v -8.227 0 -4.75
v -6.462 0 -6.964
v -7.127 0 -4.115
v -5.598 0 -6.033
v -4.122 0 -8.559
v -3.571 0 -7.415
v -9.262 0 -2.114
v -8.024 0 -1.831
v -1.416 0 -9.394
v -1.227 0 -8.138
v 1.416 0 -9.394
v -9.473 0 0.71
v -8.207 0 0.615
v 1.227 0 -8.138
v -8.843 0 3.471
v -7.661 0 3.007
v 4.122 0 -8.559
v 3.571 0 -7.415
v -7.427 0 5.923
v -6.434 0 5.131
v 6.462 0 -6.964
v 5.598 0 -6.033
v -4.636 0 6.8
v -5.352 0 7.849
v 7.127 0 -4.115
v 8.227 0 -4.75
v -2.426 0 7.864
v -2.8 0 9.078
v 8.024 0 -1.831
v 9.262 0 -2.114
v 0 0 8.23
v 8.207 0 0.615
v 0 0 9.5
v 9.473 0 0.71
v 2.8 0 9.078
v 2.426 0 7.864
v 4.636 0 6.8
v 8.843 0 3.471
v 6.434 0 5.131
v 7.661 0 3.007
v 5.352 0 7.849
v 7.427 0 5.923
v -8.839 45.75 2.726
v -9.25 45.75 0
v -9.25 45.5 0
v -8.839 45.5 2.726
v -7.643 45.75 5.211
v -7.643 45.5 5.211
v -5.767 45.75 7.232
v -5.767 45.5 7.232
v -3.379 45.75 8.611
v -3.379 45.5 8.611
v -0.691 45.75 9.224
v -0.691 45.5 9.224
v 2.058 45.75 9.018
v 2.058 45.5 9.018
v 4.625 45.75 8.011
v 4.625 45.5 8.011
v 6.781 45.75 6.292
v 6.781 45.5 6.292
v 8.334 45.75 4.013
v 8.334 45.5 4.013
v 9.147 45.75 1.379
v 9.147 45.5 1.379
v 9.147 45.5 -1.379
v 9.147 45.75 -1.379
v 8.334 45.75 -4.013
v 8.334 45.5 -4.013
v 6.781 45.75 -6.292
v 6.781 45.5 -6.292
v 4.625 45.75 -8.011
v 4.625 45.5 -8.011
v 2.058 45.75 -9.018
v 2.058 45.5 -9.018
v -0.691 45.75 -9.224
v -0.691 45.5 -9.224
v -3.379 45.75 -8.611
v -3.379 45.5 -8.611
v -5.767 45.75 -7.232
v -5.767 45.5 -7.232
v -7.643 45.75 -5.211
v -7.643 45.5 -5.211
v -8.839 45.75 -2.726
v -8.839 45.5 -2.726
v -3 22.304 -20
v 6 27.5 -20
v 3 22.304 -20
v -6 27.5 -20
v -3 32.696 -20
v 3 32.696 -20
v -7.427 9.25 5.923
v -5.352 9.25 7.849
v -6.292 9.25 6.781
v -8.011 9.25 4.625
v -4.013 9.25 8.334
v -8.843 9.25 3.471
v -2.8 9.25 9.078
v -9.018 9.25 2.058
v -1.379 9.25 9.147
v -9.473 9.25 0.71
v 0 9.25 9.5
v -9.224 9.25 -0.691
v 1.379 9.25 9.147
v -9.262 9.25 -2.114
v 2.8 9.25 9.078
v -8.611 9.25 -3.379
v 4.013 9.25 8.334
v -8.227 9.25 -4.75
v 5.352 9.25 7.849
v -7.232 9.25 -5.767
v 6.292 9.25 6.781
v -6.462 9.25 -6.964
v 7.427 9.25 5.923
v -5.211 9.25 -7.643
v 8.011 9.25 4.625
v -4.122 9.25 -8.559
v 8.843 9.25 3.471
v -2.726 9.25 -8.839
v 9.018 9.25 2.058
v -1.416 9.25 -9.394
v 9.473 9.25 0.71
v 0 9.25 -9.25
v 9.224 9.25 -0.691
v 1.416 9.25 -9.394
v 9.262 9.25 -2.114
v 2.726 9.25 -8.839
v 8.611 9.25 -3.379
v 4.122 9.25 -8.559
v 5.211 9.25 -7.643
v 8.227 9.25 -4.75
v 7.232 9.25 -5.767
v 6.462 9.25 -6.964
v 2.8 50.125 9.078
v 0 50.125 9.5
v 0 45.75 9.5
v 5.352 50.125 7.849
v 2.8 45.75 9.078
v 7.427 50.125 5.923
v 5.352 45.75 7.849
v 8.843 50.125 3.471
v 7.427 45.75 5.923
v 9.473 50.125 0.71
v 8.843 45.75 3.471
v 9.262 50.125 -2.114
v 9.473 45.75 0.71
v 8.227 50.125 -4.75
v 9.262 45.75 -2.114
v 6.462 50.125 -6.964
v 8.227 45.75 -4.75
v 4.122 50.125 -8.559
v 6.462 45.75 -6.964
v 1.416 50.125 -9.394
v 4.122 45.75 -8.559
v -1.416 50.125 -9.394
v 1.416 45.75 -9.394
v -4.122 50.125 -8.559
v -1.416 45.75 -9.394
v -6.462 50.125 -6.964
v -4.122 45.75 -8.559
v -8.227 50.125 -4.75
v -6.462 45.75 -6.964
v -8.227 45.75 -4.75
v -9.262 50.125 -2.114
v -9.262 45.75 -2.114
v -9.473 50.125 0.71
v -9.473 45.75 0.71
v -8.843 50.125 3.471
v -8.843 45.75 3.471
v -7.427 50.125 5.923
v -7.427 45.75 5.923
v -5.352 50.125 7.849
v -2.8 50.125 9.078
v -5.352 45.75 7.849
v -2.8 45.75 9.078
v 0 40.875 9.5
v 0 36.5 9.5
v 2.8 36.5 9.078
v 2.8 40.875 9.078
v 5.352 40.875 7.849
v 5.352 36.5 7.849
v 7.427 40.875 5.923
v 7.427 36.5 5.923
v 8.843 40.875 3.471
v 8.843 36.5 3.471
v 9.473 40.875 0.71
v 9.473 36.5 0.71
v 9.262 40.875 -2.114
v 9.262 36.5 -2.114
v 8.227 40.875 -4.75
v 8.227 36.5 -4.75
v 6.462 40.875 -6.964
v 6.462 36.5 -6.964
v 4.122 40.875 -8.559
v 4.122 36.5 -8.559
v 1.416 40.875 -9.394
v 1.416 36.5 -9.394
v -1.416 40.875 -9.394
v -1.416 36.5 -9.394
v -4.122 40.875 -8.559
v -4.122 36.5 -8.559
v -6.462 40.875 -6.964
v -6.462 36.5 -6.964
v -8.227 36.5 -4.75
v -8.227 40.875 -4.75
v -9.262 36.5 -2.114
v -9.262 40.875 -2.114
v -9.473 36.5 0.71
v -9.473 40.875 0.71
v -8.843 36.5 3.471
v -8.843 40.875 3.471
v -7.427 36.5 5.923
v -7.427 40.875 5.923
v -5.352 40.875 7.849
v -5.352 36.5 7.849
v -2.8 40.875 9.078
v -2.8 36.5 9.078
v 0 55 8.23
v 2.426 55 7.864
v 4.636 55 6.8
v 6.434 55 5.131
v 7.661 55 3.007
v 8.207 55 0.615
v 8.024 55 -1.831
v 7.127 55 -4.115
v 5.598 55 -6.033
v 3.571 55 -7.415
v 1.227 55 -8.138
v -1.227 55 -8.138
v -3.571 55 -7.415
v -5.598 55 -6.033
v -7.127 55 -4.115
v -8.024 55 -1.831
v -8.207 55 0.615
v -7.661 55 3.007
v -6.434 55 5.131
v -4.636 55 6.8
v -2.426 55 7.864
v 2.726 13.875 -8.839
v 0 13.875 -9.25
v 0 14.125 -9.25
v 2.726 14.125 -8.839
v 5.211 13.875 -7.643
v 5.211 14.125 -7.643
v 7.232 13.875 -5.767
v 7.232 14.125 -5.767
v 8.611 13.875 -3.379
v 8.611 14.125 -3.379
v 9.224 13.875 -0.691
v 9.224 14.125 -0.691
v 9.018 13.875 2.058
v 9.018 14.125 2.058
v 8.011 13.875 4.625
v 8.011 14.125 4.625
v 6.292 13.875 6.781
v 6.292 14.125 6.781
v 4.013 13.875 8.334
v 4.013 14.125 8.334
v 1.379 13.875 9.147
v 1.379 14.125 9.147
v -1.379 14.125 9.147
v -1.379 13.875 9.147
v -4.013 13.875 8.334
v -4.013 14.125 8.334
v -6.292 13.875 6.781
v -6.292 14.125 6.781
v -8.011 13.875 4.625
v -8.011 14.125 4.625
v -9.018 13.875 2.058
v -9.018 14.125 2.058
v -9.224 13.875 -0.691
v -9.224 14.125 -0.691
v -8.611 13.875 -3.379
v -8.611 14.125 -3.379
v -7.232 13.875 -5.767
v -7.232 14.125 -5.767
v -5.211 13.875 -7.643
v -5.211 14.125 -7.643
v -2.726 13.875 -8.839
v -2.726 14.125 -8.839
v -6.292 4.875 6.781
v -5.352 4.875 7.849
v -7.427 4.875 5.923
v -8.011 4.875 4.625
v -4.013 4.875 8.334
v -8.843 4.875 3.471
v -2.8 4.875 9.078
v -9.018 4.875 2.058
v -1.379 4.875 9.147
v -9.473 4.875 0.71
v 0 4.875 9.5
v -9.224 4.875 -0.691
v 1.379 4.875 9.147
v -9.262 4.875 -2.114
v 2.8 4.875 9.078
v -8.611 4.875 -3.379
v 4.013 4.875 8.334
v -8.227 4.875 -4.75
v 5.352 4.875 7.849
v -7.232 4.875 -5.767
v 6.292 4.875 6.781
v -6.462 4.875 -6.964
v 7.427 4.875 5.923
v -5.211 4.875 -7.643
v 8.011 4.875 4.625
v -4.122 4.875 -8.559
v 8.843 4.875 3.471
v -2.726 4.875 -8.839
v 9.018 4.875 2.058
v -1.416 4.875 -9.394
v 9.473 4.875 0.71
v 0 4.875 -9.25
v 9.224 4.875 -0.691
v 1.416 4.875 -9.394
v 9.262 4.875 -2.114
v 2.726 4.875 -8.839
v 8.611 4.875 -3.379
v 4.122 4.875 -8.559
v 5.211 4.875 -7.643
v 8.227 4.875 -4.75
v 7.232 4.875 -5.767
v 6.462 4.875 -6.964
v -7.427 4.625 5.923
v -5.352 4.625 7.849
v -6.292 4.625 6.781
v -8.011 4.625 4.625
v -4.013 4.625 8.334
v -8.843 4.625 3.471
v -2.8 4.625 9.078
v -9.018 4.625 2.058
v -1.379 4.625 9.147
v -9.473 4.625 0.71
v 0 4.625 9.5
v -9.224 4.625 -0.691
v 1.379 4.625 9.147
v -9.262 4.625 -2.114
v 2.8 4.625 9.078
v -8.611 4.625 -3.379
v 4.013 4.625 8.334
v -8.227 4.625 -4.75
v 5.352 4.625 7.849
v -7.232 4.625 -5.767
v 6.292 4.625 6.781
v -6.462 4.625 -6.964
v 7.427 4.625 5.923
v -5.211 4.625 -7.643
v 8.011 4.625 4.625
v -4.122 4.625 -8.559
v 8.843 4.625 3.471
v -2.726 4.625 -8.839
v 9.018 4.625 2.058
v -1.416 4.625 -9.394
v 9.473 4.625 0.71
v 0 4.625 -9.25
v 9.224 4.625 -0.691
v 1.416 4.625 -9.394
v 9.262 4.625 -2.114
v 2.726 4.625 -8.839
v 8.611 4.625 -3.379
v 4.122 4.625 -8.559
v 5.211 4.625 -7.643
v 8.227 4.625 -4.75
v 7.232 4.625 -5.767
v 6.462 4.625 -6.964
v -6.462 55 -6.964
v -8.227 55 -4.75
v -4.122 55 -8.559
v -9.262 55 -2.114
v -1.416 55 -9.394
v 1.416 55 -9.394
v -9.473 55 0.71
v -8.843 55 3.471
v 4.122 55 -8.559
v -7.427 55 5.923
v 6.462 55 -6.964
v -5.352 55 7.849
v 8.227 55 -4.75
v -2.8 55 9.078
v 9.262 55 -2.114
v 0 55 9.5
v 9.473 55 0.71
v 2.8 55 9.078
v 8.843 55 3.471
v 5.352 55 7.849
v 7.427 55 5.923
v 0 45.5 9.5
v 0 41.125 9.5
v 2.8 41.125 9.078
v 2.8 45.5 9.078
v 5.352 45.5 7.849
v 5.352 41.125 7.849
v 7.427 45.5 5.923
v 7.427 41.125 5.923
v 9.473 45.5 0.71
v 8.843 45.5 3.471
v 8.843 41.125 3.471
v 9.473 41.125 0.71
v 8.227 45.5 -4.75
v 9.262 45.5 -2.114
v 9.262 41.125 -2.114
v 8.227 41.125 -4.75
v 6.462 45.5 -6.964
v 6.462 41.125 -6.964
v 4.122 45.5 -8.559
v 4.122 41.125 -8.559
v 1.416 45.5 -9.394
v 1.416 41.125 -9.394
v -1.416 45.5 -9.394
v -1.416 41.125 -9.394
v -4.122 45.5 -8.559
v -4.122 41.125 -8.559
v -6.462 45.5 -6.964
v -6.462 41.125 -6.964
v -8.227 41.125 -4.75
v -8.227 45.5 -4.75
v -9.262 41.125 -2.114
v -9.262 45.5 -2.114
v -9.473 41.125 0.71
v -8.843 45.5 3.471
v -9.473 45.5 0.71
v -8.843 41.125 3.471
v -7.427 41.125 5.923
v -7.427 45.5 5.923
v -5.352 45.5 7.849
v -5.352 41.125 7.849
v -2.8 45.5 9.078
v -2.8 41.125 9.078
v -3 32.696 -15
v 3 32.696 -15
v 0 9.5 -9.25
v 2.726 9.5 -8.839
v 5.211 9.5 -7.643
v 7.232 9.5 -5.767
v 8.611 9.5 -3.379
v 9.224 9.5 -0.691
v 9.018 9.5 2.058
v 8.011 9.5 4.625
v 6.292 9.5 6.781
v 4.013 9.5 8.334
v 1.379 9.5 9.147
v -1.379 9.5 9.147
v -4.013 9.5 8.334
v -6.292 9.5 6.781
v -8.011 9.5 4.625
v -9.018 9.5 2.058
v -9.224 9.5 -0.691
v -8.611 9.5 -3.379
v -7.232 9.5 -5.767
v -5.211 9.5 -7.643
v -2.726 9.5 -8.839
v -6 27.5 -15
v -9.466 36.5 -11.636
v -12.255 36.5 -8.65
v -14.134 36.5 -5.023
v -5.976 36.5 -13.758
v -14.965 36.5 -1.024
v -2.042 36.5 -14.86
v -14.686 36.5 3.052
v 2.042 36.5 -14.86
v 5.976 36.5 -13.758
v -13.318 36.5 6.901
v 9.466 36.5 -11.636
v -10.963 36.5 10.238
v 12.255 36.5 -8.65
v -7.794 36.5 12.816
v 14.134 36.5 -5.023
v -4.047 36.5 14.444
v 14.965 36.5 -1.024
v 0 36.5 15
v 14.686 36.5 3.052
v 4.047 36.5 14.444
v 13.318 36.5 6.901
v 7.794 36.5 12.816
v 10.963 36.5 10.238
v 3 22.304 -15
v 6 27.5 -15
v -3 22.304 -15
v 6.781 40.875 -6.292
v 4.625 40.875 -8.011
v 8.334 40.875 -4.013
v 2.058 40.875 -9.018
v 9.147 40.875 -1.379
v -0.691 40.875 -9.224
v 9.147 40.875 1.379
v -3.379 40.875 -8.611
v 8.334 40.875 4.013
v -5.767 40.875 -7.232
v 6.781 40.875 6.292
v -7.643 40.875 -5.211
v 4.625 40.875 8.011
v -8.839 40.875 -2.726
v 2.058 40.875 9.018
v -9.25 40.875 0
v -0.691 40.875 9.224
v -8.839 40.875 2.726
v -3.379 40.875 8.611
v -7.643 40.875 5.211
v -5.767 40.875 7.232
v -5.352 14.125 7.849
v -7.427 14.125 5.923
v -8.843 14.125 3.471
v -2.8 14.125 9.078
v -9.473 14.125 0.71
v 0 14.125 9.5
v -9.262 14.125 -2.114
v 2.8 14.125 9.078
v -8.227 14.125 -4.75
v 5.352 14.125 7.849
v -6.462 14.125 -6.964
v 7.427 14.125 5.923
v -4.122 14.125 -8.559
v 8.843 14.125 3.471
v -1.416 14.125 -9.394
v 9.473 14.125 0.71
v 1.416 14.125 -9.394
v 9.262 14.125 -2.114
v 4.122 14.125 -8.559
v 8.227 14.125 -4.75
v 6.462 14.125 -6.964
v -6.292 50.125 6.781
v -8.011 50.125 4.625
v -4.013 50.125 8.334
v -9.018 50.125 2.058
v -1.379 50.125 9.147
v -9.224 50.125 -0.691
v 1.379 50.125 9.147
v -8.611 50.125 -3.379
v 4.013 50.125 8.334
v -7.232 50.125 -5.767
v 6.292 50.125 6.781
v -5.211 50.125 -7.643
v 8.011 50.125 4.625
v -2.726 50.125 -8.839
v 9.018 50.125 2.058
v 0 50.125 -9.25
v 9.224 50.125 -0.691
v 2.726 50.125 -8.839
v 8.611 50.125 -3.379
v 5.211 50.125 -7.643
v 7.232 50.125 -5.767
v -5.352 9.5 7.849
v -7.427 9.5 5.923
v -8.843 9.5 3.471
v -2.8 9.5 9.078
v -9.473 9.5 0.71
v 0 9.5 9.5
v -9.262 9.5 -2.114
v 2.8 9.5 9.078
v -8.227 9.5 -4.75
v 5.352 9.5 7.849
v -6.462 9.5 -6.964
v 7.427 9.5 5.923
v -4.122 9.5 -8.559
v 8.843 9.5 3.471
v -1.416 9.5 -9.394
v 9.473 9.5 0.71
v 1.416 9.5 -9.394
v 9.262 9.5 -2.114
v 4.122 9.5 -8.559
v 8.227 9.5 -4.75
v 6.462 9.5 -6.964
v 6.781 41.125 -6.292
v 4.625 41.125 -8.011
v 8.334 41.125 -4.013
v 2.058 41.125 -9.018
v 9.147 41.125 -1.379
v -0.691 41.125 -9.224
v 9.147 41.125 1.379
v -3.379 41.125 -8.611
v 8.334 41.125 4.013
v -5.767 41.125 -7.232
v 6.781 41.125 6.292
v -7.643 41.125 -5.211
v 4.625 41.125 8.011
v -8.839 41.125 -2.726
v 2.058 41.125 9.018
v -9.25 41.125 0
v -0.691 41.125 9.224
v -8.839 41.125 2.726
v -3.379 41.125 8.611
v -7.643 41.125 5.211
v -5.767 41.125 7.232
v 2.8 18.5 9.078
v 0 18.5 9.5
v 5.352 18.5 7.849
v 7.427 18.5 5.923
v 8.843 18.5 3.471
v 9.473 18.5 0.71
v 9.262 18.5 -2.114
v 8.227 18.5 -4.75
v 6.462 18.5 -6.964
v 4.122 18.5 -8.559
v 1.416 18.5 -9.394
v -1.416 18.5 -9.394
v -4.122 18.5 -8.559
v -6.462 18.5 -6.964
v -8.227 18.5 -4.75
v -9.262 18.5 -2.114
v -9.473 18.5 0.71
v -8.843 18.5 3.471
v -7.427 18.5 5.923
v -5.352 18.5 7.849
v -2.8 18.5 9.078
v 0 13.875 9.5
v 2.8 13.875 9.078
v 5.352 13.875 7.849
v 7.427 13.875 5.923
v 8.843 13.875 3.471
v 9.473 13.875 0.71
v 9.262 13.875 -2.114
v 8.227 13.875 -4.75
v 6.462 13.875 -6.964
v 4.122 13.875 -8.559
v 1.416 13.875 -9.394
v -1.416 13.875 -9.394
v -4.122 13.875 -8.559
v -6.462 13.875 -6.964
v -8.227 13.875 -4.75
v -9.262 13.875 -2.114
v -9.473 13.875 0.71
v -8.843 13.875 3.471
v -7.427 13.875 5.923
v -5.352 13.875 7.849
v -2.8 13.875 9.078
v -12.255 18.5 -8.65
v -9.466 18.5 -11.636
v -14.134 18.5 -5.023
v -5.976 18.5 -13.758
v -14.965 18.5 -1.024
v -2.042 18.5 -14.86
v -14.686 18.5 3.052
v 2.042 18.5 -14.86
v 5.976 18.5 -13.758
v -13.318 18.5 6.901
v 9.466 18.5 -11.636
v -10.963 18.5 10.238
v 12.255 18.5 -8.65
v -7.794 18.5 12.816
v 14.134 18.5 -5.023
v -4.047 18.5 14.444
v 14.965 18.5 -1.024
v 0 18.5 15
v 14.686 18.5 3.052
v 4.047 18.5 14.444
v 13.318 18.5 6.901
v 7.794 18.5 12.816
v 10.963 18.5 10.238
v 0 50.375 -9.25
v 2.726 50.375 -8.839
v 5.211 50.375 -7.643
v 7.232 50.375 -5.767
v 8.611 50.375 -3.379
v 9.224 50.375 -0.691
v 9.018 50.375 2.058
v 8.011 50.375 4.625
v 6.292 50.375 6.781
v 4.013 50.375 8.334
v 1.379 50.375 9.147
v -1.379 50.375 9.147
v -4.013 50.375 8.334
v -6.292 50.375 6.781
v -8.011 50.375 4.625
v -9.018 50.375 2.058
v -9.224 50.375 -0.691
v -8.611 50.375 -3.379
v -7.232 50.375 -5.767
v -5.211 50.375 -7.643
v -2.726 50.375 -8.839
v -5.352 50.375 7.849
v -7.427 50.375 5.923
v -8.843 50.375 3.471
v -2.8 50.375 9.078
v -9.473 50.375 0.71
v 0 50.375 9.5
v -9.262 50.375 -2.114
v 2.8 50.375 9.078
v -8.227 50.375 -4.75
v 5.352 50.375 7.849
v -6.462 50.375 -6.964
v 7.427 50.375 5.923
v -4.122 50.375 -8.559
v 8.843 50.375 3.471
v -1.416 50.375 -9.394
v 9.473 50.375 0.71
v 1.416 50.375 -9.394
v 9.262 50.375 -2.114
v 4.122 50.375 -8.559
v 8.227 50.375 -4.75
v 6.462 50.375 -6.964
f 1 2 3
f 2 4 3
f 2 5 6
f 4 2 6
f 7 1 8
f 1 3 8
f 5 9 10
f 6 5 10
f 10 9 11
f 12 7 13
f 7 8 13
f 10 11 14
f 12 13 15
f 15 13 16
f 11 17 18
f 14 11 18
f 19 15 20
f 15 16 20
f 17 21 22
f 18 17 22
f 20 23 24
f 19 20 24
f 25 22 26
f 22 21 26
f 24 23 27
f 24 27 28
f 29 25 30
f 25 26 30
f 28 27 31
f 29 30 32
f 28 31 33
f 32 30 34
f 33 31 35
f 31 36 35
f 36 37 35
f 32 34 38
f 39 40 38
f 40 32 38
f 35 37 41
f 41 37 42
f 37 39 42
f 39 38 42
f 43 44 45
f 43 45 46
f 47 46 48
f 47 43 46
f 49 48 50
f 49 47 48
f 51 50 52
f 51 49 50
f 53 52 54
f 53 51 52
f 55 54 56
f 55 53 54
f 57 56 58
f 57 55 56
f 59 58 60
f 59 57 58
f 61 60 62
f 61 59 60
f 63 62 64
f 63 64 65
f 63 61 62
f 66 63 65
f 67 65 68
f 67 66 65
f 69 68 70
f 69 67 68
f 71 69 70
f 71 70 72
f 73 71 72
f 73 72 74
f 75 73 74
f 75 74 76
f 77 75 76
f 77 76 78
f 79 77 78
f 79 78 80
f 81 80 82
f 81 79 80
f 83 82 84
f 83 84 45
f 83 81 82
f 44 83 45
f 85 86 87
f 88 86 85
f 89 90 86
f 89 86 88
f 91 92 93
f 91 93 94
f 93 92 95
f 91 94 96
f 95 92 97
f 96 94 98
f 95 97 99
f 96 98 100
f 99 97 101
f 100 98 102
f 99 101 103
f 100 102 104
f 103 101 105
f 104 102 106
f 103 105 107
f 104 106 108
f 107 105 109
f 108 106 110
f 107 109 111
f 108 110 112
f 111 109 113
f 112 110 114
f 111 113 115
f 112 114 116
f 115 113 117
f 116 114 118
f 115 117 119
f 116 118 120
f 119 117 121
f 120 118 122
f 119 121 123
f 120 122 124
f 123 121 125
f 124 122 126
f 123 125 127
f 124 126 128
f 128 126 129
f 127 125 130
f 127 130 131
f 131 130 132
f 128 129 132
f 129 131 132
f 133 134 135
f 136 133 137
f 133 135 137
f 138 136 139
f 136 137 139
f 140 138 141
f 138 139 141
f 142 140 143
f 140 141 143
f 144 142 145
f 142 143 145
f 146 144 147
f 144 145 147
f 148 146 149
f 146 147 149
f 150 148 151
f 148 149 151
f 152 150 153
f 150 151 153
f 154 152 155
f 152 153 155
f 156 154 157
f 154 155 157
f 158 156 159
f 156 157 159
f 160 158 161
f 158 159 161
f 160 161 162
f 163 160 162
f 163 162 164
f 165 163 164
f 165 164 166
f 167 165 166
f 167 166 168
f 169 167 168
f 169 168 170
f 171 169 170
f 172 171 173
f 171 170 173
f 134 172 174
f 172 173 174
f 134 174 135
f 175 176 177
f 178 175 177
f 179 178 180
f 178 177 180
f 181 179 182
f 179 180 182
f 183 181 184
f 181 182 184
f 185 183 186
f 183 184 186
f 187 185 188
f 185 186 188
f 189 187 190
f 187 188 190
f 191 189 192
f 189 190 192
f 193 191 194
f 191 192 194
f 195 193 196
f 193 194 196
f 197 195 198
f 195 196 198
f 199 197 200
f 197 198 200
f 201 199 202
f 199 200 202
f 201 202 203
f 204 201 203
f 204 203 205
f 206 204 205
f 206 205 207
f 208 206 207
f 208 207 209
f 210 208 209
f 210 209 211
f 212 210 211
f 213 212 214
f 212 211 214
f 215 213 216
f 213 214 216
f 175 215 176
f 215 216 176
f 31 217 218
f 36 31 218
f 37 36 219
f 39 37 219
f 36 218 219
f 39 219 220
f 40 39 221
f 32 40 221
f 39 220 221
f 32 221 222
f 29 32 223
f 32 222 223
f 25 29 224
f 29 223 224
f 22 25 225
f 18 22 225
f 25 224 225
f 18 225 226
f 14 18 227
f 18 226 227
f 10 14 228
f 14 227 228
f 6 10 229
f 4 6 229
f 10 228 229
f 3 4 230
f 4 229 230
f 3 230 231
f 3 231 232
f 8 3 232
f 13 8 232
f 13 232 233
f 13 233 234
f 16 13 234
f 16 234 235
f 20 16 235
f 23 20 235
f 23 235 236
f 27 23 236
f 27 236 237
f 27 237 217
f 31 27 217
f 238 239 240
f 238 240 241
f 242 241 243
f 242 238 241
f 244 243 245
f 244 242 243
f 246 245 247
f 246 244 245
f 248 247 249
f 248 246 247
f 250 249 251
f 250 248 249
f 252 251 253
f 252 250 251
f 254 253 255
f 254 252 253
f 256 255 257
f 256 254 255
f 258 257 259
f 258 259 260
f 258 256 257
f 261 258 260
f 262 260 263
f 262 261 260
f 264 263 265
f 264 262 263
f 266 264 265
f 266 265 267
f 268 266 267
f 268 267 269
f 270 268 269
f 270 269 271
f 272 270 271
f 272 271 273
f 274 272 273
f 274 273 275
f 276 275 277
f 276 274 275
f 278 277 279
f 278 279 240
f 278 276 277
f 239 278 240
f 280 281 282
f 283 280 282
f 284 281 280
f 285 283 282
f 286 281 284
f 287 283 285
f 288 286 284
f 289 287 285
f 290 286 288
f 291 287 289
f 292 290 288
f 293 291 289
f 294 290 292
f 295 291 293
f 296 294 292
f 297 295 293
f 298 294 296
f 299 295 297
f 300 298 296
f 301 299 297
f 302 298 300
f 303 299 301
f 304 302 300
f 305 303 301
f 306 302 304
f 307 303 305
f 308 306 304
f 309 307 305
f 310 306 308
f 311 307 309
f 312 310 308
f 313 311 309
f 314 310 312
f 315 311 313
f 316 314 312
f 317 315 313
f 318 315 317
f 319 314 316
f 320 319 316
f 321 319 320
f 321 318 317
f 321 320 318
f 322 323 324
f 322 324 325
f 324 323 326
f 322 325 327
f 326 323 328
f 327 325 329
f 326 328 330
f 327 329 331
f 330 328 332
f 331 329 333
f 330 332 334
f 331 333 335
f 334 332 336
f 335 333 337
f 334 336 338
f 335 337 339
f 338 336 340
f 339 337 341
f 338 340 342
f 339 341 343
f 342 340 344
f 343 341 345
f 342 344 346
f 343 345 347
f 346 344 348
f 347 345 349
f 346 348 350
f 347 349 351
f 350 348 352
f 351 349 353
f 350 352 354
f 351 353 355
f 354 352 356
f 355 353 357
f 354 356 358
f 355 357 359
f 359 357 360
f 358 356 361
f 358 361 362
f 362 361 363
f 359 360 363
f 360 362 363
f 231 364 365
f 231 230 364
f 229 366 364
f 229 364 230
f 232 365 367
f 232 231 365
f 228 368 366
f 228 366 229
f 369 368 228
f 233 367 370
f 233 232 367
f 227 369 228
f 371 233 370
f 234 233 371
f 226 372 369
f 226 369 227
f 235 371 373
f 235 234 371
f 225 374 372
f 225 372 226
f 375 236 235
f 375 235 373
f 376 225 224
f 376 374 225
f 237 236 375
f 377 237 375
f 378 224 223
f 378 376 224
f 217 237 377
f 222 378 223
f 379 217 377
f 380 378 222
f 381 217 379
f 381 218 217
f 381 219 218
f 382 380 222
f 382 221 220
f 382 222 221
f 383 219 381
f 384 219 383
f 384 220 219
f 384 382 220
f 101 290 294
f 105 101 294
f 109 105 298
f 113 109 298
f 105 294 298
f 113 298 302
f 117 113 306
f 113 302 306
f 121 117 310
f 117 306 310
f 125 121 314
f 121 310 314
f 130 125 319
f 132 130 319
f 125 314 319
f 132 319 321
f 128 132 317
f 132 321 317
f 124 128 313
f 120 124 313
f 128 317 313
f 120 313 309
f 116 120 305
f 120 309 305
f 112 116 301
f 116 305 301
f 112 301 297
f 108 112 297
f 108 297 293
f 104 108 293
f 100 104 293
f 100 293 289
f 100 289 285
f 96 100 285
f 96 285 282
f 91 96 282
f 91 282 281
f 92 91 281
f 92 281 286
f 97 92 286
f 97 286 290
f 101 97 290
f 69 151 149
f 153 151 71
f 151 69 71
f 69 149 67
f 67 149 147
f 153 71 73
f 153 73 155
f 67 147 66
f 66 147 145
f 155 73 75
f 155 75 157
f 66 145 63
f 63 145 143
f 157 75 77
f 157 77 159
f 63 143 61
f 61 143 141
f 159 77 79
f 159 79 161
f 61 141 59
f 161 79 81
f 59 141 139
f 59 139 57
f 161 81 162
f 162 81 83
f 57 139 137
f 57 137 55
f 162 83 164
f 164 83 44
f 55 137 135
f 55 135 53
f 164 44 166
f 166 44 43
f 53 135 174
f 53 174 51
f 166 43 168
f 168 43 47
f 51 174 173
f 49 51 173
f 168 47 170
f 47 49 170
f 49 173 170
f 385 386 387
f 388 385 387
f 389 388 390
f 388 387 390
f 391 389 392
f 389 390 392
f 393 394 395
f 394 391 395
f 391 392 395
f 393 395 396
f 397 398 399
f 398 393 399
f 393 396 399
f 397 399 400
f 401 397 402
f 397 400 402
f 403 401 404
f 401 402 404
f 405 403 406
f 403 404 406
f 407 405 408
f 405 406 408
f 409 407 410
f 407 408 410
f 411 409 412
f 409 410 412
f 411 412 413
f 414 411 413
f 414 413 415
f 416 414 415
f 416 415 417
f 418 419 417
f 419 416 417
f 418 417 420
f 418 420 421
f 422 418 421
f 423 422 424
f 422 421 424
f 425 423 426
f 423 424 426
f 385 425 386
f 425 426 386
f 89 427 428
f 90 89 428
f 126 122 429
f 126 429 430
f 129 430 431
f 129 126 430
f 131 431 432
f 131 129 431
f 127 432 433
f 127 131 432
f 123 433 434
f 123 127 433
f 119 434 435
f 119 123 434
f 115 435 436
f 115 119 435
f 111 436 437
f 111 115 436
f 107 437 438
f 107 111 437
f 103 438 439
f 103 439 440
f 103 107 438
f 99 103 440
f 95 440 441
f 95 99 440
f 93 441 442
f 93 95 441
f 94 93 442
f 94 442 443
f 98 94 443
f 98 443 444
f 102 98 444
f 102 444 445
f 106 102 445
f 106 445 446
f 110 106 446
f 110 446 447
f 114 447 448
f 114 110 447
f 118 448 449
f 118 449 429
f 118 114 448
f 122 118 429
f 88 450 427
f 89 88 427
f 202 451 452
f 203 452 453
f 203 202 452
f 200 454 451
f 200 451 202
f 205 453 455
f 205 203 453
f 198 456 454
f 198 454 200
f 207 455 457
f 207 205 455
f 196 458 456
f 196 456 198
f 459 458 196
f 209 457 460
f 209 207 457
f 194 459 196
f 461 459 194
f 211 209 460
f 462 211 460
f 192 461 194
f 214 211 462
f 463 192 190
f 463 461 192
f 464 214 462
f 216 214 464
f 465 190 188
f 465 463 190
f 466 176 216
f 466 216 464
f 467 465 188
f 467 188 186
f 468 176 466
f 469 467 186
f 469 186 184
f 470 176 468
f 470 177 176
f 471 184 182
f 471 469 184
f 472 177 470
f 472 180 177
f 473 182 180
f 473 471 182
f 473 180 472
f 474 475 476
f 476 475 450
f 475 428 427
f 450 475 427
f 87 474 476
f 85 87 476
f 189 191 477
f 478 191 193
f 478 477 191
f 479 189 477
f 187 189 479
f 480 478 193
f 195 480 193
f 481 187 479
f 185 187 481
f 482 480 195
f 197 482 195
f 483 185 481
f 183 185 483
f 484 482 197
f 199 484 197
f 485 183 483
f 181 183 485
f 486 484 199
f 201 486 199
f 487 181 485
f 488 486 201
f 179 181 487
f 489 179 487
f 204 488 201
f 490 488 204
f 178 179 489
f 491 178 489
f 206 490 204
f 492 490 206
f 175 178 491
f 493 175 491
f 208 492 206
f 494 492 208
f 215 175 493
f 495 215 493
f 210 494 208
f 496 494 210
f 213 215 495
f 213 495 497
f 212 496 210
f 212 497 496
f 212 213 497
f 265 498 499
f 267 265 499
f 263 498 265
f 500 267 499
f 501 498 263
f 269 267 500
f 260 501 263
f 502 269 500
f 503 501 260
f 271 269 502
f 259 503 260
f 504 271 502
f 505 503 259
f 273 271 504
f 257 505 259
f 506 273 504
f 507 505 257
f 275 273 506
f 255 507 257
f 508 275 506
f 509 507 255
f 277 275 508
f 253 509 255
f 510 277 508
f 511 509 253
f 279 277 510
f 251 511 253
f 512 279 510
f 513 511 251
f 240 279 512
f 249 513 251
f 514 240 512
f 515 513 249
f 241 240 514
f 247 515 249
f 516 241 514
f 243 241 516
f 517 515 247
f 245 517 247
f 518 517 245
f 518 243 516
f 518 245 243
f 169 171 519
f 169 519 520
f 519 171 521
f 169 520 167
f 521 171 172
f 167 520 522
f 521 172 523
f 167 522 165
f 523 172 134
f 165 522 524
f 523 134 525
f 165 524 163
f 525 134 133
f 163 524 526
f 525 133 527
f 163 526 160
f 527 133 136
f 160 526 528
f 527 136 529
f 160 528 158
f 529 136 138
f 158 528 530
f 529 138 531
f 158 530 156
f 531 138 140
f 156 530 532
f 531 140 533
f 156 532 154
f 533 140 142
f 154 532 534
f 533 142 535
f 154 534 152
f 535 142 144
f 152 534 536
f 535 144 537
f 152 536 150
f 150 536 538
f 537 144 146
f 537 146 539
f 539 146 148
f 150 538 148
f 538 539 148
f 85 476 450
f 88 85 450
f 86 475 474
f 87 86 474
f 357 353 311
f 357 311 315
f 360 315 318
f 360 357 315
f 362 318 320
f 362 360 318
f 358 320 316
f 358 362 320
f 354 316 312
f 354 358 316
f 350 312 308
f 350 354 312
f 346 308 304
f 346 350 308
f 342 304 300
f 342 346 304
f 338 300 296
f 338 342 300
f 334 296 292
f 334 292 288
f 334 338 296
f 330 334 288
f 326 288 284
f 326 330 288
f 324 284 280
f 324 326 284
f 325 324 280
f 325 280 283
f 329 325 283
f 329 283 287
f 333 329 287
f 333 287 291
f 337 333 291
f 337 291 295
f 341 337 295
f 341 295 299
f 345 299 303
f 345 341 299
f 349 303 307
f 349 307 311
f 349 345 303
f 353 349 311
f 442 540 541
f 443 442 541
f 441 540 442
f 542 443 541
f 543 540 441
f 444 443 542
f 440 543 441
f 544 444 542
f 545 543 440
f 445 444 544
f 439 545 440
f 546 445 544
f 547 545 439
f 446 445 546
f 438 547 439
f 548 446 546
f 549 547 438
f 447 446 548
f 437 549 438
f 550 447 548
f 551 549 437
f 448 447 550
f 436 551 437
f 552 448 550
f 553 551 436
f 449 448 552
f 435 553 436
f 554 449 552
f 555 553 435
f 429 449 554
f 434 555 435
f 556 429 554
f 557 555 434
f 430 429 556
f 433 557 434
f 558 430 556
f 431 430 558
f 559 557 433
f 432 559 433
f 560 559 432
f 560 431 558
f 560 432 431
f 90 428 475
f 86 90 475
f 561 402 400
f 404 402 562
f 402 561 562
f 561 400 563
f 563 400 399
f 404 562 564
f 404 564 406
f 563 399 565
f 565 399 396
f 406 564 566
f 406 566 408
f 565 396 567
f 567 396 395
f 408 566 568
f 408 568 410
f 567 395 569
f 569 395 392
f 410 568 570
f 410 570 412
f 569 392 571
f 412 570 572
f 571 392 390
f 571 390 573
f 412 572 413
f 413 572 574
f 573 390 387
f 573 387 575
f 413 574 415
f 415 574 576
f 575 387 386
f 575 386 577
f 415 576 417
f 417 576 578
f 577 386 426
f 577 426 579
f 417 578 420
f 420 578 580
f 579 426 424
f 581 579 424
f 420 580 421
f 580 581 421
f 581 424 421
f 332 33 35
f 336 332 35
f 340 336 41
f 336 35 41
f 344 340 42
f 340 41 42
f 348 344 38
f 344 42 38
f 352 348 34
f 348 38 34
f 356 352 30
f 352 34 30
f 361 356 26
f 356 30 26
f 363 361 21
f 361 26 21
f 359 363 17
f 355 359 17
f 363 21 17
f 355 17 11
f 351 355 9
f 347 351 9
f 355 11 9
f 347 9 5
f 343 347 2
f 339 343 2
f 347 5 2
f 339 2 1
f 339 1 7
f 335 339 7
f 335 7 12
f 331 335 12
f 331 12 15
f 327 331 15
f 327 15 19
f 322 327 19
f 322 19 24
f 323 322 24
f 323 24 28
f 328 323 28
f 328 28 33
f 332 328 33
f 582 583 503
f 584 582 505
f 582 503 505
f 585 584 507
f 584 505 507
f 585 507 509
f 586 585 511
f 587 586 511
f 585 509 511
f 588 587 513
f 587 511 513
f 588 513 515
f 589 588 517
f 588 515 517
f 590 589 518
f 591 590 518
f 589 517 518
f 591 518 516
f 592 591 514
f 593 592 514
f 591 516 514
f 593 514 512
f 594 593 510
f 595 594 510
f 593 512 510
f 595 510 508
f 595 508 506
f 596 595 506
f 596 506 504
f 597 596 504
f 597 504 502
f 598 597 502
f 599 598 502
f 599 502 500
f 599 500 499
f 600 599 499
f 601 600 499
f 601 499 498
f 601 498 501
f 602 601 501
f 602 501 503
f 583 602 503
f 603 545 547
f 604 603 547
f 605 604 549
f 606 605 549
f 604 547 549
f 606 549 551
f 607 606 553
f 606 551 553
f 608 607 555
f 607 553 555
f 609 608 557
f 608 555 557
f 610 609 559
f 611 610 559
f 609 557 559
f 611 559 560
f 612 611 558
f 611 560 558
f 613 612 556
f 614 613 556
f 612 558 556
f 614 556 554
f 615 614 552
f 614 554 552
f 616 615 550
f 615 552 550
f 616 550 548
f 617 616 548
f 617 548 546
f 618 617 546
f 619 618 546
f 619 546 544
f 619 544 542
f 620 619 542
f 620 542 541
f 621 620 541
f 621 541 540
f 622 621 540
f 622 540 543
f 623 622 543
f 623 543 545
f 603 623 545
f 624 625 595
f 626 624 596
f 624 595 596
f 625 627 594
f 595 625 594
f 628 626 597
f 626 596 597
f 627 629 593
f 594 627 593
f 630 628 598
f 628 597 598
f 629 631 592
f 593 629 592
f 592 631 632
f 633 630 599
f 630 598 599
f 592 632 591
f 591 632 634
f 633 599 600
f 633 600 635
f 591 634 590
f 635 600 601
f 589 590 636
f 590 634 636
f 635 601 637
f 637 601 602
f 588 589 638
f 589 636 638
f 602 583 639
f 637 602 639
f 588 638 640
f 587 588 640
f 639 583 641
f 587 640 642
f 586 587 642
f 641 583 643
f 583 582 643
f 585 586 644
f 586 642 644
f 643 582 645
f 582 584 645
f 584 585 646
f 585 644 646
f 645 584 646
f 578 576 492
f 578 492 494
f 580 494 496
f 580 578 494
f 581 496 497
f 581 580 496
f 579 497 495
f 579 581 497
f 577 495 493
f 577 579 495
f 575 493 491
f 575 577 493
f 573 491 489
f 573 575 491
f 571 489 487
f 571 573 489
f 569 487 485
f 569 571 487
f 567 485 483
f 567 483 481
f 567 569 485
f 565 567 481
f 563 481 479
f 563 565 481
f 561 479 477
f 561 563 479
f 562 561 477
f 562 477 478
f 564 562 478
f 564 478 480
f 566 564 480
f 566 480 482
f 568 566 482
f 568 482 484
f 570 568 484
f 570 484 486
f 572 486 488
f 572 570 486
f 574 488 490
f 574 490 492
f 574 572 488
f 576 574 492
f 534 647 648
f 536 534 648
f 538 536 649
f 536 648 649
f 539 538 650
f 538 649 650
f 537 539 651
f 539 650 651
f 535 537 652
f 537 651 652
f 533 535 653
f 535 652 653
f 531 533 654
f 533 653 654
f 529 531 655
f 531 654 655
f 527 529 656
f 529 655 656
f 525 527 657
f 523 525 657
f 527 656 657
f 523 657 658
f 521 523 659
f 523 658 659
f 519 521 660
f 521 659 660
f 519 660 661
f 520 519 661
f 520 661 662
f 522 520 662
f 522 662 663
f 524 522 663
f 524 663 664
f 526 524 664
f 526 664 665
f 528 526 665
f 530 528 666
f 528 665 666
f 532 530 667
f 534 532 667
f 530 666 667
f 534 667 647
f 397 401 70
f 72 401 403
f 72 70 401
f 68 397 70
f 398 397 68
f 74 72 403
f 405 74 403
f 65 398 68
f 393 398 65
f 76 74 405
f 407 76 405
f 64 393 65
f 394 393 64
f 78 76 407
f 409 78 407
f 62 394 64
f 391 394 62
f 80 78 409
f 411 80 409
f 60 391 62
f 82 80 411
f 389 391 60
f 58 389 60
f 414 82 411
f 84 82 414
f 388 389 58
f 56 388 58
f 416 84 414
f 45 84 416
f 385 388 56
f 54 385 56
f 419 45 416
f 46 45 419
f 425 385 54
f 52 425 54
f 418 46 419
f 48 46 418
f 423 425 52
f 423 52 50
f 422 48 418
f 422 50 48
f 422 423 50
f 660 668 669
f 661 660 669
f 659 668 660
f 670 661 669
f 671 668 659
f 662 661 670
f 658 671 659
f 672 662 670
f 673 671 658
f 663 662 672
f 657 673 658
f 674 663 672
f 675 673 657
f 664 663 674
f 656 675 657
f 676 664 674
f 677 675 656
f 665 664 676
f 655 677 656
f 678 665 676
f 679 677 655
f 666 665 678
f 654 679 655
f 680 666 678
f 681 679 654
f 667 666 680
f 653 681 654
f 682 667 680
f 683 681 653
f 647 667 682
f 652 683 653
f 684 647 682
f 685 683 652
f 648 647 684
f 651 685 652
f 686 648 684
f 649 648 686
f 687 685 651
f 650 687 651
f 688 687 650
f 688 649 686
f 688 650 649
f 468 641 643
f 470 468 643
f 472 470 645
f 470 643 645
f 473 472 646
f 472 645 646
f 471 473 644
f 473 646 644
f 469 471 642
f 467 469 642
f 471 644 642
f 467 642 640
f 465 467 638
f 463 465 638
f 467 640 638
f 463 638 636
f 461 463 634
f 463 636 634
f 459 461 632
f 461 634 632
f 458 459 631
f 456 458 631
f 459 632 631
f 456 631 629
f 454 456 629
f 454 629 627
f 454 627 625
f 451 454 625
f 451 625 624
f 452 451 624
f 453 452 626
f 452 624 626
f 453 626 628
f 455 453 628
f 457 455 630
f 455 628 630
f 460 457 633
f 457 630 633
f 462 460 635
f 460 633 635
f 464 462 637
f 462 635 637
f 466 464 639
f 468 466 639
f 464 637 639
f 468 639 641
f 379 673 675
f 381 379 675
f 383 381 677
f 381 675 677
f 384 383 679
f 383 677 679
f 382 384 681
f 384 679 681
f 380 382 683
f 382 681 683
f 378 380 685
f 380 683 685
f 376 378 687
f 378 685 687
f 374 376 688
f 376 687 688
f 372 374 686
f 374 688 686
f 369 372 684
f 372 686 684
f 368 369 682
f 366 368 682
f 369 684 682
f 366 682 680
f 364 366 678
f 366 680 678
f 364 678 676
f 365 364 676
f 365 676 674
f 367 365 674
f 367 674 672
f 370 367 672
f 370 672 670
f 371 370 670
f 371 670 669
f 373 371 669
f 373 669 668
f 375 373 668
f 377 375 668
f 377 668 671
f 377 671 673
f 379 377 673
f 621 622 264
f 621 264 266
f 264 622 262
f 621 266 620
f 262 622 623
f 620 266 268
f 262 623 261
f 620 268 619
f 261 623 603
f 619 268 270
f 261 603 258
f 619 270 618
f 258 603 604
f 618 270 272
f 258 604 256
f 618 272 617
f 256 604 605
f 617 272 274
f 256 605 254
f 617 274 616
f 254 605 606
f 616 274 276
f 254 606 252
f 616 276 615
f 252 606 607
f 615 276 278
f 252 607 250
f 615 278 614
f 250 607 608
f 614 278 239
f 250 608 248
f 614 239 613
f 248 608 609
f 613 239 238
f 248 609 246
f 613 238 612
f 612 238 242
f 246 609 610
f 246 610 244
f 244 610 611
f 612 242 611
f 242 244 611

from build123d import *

# Parameters (mm, degrees)
SKETCH1_R                 = 9.5
BOSS_EXTRUDE1_DEPTH       = 18.5
SKETCH2_R                 = 15
BOSS_EXTRUDE2_DEPTH       = 18
SKETCH3_R                 = 9.5
BOSS_EXTRUDE3_DEPTH       = 18.5
SKETCH4_R                 = 9.5
SKETCH4_R_2               = 9.25
CUT_EXTRUDE3_DEPTH        = 0.25
LPATTERN1_COUNT           = 3
LPATTERN1_PITCH           = 4.625
MIRROR1_COPY_1_SKETCH_R   = 9.5
MIRROR1_COPY_1_SKETCH_R_2 = 9.25
MIRROR1_COPY_1_DEPTH      = 0.25
MIRROR1_COPY_2_SKETCH_R   = 9.5
MIRROR1_COPY_2_SKETCH_R_2 = 9.25
MIRROR1_COPY_2_DEPTH      = 0.25
BOSS_EXTRUDE4_DEPTH       = 5
SKETCH6_R                 = 8.23
CUT_EXTRUDE4_DEPTH        = 61.415229868


with BuildPart() as part:
    # Sketch1 → Boss-Extrude1 (new body)
    with BuildSketch(Plane(origin=(0, 0, 0), x_dir=(1, 0, 0), z_dir=(0, 1, 0))):
        with Locations(Location((0, 0, 0), (0, 0, 270))):
            Circle(SKETCH1_R)
    extrude(amount=BOSS_EXTRUDE1_DEPTH)

    # Sketch2 → Boss-Extrude2 (add)
    with BuildSketch(Plane(origin=(0, 18.5, 0), x_dir=(1, 0, 0), z_dir=(0, 1, 0))):
        with Locations(Location((0, 0, 0), (0, 0, 270))):
            Circle(SKETCH2_R)
    extrude(amount=BOSS_EXTRUDE2_DEPTH)

    # Sketch3 → Boss-Extrude3 (add)
    with BuildSketch(Plane(origin=(0, 36.5, 0), x_dir=(1, 0, 0), z_dir=(0, 1, 0))):
        with Locations(Location((0, 0, 0), (0, 0, 270))):
            Circle(SKETCH3_R)
    extrude(amount=BOSS_EXTRUDE3_DEPTH)

    # Sketch4 → Cut-Extrude3 (cut)
    with BuildSketch(Plane(origin=(0, 4.625, 0), x_dir=(-1, 0, 0), z_dir=(0, -1, 0))):
        with Locations(Location((0, 0, 0), (0, 0, 90))):
            Circle(SKETCH4_R)
        with Locations(Location((0, 0, 0), (0, 0, 90))):
            Circle(SKETCH4_R_2, mode=Mode.SUBTRACT)
    cut_extrude3 = extrude(amount=-CUT_EXTRUDE3_DEPTH, mode=Mode.SUBTRACT)

    # LPattern1: Cut-Extrude3 ×3
    with Locations(*[(0, i * LPATTERN1_PITCH, 0) for i in range(1, LPATTERN1_COUNT)]):
        add(cut_extrude3, mode=Mode.SUBTRACT)

    # Mirror1: Cut-Extrude3 across plane
    add(cut_extrude3.mirror(Plane(origin=(0, 27.5, 0), x_dir=(0, 0, 1), z_dir=(0, -1, 0))), mode=Mode.SUBTRACT)

    # Mirror1 copy 1 sketch → Mirror1 copy 1 (cut)
    with BuildSketch(Plane(origin=(0, 45.75, 0), x_dir=(-1, 0, 0), z_dir=(0, 1, 0))):
        Circle(MIRROR1_COPY_1_SKETCH_R)
        Circle(MIRROR1_COPY_1_SKETCH_R_2, mode=Mode.SUBTRACT)
    extrude(amount=-MIRROR1_COPY_1_DEPTH, mode=Mode.SUBTRACT)

    # Mirror1 copy 2 sketch → Mirror1 copy 2 (cut)
    with BuildSketch(Plane(origin=(0, 41.125, 0), x_dir=(-1, 0, 0), z_dir=(0, 1, 0))):
        Circle(MIRROR1_COPY_2_SKETCH_R)
        Circle(MIRROR1_COPY_2_SKETCH_R_2, mode=Mode.SUBTRACT)
    extrude(amount=-MIRROR1_COPY_2_DEPTH, mode=Mode.SUBTRACT)

    # Sketch6 → Cut-Extrude4 (cut, through all)
    with BuildSketch(Plane(origin=(0, 55, 0), x_dir=(1, 0, 0), z_dir=(0, 1, 0))):
        with Locations(Location((0, 0, 0), (0, 0, 270))):
            Circle(SKETCH6_R)
    extrude(amount=-CUT_EXTRUDE4_DEPTH, mode=Mode.SUBTRACT)


with BuildPart() as body_2:
    # Sketch5 → Boss-Extrude4 (new body)
    with BuildSketch(Plane(origin=(0, 0, -15), x_dir=(-1, 0, 0), z_dir=(0, 0, -1))):
        Polygon((-3, 22.303847577), (3, 22.303847577), (6, 27.5), (3, 32.696152423), (-3, 32.696152423), (-6, 27.5), align=None)
    extrude(amount=BOSS_EXTRUDE4_DEPTH)


solid = Compound([part.part, body_2.part])
